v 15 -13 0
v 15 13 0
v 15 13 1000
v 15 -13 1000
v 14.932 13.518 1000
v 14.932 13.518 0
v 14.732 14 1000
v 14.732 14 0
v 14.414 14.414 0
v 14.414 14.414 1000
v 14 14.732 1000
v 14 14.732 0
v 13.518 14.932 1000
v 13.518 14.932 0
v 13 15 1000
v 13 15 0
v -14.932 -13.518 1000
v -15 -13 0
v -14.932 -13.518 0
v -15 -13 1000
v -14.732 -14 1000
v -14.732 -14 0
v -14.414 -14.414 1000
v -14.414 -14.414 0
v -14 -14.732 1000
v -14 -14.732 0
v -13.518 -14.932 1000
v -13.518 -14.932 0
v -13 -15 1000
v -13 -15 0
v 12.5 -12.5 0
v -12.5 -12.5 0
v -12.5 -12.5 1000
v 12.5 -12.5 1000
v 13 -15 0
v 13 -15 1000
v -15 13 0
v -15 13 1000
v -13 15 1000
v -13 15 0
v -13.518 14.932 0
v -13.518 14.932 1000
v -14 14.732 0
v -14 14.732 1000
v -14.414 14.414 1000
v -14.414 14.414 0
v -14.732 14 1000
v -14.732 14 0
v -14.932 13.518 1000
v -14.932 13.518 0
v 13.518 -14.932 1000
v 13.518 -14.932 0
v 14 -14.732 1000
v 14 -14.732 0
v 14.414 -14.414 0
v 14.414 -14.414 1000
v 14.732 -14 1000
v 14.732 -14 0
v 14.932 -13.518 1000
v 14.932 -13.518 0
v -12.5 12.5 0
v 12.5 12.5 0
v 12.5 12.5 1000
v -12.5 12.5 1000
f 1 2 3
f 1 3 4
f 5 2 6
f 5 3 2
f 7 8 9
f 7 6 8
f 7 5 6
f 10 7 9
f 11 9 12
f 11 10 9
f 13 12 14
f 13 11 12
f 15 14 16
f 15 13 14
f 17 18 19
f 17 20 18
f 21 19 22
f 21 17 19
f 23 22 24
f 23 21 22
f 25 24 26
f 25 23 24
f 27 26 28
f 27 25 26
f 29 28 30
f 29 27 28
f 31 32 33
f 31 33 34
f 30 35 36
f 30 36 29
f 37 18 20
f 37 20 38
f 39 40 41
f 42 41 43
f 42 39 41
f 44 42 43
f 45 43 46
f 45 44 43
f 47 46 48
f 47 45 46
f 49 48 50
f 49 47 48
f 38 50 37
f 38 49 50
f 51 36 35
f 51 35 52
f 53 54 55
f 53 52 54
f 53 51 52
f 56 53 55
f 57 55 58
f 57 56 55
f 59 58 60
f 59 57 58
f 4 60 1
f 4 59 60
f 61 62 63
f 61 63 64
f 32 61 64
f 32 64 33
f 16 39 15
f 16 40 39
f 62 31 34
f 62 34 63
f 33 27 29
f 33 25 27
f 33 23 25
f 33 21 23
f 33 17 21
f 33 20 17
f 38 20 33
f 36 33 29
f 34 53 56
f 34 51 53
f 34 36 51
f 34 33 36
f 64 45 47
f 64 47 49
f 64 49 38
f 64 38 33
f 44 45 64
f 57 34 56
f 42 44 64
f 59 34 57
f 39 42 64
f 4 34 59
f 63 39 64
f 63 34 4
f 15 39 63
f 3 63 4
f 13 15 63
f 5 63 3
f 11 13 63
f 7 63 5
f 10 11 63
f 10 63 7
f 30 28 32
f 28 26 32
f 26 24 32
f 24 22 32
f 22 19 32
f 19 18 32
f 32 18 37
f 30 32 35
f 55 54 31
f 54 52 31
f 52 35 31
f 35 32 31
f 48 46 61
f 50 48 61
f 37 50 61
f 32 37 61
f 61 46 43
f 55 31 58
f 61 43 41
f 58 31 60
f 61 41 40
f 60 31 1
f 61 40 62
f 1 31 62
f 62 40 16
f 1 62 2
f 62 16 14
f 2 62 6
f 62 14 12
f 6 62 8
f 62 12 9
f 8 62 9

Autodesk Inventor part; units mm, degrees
ref_plane "YZ Plane" through (0, 0, 0) normal (1, 0, 0) x (0, 1, 0)
ref_plane "XZ Plane" through (0, 0, 0) normal (0, 1, 0) x (-1, 0, 0)
sketch "Sketch1" plane through (0, 0, 0) normal (0, 0, 1) x (1, 0, 0)
  line L0 (-15, 15) -> (15, 15)
  line L1 (15, 15) -> (15, -15)
  line L2 (15, -15) -> (-15, -15)
  line L3 (-15, -15) -> (-15, 15)
  line L4 (12.5, 12.5) -> (-12.5, 12.5)
  line L5 (-12.5, 12.5) -> (-12.5, -12.5)
  line L6 (-12.5, -12.5) -> (12.5, -12.5)
  line L7 (12.5, -12.5) -> (12.5, 12.5)
  point P0 (0, 0)
  dimension "d0" = 30
  dimension "d1" = 30
  dimension "d2" = 15
  dimension "d3" = 15
  dimension "d4" = 2.5
extrude "Extrusion1" add sketch "Sketch1" along normal blind 1000
fillet "Fillet1" radius 2 4 edges at (15, 15, 500) (-15, 15, 500) (-15, -15, 500) (15, -15, 500)
ref_plane "Work Plane1" through (0, 0, 150) normal (0, 0, -1) x (-1, 0, 0)
split "Split1" [suppressed]
equation "\"d0\" = sm_varx_squareBarDimension"
equation "\"d1\" = d0"
equation "\"d2\" = 0.5 * d1"
equation "\"d3\" = 0.5 * d0"
equation "\"d4\" = sm_varx_squareBarThickness"
equation "\"sm_varx_squareBarDimension\" = 30"
equation "\"sm_varx_squareBarThickness\" = 2.5"
equation "\"hoop_angle_z\" = 45deg"
equation "\"hoop_bearing_length\" = 5deg"
equation "\"hoop_cable_diam\" = 5"
equation "\"hoop_cable_pulley_diam\" = 22"
equation "\"rack_tooth_addendum\" = 5"
equation "\"rack_tooth_dedendum\" = 5"
equation "\"rack_tooth_thickness\" = 5"
equation "\"secure_arm_angle\" = 20deg"
equation "\"secure_arm_hold_length\" = 35"
equation "\"secure_arm_radii\" = 9"
equation "\"support_baseClamp_platformLengthBuffer\" = 35"
equation "\"support_baseClamp_platformThickness\" = 15"
equation "\"support_baseClamp_platformWidthBuffer\" = 0"
equation "\"support_baseClamp_sleeveHoleDiameter\" = 12"
equation "\"support_baseClamp_sleeveSweepTerminationAngle\" = 55deg"
equation "\"support_baseClamp_thickness\" = 8"
equation "\"support_frame_endHoleBuffer\" = 25"
equation "\"support_frame_squareBarFillet\" = 2"
equation "\"support_frame_squareBarThickness\" = 5"
equation "\"hoop_tabs_thickness\" = 6"
equation "\"hoop_tabs_hole\" = 4"
equation "\"wheelchair_deployed_width\" = 635"
equation "\"wheelchair_deployed_length\" = 1067"
equation "\"wheelchair_deployed_height\" = 914"
properties part number "bar_steel_square_hollow_30x30x1000_2.5" material "Steel, Galvanized"
